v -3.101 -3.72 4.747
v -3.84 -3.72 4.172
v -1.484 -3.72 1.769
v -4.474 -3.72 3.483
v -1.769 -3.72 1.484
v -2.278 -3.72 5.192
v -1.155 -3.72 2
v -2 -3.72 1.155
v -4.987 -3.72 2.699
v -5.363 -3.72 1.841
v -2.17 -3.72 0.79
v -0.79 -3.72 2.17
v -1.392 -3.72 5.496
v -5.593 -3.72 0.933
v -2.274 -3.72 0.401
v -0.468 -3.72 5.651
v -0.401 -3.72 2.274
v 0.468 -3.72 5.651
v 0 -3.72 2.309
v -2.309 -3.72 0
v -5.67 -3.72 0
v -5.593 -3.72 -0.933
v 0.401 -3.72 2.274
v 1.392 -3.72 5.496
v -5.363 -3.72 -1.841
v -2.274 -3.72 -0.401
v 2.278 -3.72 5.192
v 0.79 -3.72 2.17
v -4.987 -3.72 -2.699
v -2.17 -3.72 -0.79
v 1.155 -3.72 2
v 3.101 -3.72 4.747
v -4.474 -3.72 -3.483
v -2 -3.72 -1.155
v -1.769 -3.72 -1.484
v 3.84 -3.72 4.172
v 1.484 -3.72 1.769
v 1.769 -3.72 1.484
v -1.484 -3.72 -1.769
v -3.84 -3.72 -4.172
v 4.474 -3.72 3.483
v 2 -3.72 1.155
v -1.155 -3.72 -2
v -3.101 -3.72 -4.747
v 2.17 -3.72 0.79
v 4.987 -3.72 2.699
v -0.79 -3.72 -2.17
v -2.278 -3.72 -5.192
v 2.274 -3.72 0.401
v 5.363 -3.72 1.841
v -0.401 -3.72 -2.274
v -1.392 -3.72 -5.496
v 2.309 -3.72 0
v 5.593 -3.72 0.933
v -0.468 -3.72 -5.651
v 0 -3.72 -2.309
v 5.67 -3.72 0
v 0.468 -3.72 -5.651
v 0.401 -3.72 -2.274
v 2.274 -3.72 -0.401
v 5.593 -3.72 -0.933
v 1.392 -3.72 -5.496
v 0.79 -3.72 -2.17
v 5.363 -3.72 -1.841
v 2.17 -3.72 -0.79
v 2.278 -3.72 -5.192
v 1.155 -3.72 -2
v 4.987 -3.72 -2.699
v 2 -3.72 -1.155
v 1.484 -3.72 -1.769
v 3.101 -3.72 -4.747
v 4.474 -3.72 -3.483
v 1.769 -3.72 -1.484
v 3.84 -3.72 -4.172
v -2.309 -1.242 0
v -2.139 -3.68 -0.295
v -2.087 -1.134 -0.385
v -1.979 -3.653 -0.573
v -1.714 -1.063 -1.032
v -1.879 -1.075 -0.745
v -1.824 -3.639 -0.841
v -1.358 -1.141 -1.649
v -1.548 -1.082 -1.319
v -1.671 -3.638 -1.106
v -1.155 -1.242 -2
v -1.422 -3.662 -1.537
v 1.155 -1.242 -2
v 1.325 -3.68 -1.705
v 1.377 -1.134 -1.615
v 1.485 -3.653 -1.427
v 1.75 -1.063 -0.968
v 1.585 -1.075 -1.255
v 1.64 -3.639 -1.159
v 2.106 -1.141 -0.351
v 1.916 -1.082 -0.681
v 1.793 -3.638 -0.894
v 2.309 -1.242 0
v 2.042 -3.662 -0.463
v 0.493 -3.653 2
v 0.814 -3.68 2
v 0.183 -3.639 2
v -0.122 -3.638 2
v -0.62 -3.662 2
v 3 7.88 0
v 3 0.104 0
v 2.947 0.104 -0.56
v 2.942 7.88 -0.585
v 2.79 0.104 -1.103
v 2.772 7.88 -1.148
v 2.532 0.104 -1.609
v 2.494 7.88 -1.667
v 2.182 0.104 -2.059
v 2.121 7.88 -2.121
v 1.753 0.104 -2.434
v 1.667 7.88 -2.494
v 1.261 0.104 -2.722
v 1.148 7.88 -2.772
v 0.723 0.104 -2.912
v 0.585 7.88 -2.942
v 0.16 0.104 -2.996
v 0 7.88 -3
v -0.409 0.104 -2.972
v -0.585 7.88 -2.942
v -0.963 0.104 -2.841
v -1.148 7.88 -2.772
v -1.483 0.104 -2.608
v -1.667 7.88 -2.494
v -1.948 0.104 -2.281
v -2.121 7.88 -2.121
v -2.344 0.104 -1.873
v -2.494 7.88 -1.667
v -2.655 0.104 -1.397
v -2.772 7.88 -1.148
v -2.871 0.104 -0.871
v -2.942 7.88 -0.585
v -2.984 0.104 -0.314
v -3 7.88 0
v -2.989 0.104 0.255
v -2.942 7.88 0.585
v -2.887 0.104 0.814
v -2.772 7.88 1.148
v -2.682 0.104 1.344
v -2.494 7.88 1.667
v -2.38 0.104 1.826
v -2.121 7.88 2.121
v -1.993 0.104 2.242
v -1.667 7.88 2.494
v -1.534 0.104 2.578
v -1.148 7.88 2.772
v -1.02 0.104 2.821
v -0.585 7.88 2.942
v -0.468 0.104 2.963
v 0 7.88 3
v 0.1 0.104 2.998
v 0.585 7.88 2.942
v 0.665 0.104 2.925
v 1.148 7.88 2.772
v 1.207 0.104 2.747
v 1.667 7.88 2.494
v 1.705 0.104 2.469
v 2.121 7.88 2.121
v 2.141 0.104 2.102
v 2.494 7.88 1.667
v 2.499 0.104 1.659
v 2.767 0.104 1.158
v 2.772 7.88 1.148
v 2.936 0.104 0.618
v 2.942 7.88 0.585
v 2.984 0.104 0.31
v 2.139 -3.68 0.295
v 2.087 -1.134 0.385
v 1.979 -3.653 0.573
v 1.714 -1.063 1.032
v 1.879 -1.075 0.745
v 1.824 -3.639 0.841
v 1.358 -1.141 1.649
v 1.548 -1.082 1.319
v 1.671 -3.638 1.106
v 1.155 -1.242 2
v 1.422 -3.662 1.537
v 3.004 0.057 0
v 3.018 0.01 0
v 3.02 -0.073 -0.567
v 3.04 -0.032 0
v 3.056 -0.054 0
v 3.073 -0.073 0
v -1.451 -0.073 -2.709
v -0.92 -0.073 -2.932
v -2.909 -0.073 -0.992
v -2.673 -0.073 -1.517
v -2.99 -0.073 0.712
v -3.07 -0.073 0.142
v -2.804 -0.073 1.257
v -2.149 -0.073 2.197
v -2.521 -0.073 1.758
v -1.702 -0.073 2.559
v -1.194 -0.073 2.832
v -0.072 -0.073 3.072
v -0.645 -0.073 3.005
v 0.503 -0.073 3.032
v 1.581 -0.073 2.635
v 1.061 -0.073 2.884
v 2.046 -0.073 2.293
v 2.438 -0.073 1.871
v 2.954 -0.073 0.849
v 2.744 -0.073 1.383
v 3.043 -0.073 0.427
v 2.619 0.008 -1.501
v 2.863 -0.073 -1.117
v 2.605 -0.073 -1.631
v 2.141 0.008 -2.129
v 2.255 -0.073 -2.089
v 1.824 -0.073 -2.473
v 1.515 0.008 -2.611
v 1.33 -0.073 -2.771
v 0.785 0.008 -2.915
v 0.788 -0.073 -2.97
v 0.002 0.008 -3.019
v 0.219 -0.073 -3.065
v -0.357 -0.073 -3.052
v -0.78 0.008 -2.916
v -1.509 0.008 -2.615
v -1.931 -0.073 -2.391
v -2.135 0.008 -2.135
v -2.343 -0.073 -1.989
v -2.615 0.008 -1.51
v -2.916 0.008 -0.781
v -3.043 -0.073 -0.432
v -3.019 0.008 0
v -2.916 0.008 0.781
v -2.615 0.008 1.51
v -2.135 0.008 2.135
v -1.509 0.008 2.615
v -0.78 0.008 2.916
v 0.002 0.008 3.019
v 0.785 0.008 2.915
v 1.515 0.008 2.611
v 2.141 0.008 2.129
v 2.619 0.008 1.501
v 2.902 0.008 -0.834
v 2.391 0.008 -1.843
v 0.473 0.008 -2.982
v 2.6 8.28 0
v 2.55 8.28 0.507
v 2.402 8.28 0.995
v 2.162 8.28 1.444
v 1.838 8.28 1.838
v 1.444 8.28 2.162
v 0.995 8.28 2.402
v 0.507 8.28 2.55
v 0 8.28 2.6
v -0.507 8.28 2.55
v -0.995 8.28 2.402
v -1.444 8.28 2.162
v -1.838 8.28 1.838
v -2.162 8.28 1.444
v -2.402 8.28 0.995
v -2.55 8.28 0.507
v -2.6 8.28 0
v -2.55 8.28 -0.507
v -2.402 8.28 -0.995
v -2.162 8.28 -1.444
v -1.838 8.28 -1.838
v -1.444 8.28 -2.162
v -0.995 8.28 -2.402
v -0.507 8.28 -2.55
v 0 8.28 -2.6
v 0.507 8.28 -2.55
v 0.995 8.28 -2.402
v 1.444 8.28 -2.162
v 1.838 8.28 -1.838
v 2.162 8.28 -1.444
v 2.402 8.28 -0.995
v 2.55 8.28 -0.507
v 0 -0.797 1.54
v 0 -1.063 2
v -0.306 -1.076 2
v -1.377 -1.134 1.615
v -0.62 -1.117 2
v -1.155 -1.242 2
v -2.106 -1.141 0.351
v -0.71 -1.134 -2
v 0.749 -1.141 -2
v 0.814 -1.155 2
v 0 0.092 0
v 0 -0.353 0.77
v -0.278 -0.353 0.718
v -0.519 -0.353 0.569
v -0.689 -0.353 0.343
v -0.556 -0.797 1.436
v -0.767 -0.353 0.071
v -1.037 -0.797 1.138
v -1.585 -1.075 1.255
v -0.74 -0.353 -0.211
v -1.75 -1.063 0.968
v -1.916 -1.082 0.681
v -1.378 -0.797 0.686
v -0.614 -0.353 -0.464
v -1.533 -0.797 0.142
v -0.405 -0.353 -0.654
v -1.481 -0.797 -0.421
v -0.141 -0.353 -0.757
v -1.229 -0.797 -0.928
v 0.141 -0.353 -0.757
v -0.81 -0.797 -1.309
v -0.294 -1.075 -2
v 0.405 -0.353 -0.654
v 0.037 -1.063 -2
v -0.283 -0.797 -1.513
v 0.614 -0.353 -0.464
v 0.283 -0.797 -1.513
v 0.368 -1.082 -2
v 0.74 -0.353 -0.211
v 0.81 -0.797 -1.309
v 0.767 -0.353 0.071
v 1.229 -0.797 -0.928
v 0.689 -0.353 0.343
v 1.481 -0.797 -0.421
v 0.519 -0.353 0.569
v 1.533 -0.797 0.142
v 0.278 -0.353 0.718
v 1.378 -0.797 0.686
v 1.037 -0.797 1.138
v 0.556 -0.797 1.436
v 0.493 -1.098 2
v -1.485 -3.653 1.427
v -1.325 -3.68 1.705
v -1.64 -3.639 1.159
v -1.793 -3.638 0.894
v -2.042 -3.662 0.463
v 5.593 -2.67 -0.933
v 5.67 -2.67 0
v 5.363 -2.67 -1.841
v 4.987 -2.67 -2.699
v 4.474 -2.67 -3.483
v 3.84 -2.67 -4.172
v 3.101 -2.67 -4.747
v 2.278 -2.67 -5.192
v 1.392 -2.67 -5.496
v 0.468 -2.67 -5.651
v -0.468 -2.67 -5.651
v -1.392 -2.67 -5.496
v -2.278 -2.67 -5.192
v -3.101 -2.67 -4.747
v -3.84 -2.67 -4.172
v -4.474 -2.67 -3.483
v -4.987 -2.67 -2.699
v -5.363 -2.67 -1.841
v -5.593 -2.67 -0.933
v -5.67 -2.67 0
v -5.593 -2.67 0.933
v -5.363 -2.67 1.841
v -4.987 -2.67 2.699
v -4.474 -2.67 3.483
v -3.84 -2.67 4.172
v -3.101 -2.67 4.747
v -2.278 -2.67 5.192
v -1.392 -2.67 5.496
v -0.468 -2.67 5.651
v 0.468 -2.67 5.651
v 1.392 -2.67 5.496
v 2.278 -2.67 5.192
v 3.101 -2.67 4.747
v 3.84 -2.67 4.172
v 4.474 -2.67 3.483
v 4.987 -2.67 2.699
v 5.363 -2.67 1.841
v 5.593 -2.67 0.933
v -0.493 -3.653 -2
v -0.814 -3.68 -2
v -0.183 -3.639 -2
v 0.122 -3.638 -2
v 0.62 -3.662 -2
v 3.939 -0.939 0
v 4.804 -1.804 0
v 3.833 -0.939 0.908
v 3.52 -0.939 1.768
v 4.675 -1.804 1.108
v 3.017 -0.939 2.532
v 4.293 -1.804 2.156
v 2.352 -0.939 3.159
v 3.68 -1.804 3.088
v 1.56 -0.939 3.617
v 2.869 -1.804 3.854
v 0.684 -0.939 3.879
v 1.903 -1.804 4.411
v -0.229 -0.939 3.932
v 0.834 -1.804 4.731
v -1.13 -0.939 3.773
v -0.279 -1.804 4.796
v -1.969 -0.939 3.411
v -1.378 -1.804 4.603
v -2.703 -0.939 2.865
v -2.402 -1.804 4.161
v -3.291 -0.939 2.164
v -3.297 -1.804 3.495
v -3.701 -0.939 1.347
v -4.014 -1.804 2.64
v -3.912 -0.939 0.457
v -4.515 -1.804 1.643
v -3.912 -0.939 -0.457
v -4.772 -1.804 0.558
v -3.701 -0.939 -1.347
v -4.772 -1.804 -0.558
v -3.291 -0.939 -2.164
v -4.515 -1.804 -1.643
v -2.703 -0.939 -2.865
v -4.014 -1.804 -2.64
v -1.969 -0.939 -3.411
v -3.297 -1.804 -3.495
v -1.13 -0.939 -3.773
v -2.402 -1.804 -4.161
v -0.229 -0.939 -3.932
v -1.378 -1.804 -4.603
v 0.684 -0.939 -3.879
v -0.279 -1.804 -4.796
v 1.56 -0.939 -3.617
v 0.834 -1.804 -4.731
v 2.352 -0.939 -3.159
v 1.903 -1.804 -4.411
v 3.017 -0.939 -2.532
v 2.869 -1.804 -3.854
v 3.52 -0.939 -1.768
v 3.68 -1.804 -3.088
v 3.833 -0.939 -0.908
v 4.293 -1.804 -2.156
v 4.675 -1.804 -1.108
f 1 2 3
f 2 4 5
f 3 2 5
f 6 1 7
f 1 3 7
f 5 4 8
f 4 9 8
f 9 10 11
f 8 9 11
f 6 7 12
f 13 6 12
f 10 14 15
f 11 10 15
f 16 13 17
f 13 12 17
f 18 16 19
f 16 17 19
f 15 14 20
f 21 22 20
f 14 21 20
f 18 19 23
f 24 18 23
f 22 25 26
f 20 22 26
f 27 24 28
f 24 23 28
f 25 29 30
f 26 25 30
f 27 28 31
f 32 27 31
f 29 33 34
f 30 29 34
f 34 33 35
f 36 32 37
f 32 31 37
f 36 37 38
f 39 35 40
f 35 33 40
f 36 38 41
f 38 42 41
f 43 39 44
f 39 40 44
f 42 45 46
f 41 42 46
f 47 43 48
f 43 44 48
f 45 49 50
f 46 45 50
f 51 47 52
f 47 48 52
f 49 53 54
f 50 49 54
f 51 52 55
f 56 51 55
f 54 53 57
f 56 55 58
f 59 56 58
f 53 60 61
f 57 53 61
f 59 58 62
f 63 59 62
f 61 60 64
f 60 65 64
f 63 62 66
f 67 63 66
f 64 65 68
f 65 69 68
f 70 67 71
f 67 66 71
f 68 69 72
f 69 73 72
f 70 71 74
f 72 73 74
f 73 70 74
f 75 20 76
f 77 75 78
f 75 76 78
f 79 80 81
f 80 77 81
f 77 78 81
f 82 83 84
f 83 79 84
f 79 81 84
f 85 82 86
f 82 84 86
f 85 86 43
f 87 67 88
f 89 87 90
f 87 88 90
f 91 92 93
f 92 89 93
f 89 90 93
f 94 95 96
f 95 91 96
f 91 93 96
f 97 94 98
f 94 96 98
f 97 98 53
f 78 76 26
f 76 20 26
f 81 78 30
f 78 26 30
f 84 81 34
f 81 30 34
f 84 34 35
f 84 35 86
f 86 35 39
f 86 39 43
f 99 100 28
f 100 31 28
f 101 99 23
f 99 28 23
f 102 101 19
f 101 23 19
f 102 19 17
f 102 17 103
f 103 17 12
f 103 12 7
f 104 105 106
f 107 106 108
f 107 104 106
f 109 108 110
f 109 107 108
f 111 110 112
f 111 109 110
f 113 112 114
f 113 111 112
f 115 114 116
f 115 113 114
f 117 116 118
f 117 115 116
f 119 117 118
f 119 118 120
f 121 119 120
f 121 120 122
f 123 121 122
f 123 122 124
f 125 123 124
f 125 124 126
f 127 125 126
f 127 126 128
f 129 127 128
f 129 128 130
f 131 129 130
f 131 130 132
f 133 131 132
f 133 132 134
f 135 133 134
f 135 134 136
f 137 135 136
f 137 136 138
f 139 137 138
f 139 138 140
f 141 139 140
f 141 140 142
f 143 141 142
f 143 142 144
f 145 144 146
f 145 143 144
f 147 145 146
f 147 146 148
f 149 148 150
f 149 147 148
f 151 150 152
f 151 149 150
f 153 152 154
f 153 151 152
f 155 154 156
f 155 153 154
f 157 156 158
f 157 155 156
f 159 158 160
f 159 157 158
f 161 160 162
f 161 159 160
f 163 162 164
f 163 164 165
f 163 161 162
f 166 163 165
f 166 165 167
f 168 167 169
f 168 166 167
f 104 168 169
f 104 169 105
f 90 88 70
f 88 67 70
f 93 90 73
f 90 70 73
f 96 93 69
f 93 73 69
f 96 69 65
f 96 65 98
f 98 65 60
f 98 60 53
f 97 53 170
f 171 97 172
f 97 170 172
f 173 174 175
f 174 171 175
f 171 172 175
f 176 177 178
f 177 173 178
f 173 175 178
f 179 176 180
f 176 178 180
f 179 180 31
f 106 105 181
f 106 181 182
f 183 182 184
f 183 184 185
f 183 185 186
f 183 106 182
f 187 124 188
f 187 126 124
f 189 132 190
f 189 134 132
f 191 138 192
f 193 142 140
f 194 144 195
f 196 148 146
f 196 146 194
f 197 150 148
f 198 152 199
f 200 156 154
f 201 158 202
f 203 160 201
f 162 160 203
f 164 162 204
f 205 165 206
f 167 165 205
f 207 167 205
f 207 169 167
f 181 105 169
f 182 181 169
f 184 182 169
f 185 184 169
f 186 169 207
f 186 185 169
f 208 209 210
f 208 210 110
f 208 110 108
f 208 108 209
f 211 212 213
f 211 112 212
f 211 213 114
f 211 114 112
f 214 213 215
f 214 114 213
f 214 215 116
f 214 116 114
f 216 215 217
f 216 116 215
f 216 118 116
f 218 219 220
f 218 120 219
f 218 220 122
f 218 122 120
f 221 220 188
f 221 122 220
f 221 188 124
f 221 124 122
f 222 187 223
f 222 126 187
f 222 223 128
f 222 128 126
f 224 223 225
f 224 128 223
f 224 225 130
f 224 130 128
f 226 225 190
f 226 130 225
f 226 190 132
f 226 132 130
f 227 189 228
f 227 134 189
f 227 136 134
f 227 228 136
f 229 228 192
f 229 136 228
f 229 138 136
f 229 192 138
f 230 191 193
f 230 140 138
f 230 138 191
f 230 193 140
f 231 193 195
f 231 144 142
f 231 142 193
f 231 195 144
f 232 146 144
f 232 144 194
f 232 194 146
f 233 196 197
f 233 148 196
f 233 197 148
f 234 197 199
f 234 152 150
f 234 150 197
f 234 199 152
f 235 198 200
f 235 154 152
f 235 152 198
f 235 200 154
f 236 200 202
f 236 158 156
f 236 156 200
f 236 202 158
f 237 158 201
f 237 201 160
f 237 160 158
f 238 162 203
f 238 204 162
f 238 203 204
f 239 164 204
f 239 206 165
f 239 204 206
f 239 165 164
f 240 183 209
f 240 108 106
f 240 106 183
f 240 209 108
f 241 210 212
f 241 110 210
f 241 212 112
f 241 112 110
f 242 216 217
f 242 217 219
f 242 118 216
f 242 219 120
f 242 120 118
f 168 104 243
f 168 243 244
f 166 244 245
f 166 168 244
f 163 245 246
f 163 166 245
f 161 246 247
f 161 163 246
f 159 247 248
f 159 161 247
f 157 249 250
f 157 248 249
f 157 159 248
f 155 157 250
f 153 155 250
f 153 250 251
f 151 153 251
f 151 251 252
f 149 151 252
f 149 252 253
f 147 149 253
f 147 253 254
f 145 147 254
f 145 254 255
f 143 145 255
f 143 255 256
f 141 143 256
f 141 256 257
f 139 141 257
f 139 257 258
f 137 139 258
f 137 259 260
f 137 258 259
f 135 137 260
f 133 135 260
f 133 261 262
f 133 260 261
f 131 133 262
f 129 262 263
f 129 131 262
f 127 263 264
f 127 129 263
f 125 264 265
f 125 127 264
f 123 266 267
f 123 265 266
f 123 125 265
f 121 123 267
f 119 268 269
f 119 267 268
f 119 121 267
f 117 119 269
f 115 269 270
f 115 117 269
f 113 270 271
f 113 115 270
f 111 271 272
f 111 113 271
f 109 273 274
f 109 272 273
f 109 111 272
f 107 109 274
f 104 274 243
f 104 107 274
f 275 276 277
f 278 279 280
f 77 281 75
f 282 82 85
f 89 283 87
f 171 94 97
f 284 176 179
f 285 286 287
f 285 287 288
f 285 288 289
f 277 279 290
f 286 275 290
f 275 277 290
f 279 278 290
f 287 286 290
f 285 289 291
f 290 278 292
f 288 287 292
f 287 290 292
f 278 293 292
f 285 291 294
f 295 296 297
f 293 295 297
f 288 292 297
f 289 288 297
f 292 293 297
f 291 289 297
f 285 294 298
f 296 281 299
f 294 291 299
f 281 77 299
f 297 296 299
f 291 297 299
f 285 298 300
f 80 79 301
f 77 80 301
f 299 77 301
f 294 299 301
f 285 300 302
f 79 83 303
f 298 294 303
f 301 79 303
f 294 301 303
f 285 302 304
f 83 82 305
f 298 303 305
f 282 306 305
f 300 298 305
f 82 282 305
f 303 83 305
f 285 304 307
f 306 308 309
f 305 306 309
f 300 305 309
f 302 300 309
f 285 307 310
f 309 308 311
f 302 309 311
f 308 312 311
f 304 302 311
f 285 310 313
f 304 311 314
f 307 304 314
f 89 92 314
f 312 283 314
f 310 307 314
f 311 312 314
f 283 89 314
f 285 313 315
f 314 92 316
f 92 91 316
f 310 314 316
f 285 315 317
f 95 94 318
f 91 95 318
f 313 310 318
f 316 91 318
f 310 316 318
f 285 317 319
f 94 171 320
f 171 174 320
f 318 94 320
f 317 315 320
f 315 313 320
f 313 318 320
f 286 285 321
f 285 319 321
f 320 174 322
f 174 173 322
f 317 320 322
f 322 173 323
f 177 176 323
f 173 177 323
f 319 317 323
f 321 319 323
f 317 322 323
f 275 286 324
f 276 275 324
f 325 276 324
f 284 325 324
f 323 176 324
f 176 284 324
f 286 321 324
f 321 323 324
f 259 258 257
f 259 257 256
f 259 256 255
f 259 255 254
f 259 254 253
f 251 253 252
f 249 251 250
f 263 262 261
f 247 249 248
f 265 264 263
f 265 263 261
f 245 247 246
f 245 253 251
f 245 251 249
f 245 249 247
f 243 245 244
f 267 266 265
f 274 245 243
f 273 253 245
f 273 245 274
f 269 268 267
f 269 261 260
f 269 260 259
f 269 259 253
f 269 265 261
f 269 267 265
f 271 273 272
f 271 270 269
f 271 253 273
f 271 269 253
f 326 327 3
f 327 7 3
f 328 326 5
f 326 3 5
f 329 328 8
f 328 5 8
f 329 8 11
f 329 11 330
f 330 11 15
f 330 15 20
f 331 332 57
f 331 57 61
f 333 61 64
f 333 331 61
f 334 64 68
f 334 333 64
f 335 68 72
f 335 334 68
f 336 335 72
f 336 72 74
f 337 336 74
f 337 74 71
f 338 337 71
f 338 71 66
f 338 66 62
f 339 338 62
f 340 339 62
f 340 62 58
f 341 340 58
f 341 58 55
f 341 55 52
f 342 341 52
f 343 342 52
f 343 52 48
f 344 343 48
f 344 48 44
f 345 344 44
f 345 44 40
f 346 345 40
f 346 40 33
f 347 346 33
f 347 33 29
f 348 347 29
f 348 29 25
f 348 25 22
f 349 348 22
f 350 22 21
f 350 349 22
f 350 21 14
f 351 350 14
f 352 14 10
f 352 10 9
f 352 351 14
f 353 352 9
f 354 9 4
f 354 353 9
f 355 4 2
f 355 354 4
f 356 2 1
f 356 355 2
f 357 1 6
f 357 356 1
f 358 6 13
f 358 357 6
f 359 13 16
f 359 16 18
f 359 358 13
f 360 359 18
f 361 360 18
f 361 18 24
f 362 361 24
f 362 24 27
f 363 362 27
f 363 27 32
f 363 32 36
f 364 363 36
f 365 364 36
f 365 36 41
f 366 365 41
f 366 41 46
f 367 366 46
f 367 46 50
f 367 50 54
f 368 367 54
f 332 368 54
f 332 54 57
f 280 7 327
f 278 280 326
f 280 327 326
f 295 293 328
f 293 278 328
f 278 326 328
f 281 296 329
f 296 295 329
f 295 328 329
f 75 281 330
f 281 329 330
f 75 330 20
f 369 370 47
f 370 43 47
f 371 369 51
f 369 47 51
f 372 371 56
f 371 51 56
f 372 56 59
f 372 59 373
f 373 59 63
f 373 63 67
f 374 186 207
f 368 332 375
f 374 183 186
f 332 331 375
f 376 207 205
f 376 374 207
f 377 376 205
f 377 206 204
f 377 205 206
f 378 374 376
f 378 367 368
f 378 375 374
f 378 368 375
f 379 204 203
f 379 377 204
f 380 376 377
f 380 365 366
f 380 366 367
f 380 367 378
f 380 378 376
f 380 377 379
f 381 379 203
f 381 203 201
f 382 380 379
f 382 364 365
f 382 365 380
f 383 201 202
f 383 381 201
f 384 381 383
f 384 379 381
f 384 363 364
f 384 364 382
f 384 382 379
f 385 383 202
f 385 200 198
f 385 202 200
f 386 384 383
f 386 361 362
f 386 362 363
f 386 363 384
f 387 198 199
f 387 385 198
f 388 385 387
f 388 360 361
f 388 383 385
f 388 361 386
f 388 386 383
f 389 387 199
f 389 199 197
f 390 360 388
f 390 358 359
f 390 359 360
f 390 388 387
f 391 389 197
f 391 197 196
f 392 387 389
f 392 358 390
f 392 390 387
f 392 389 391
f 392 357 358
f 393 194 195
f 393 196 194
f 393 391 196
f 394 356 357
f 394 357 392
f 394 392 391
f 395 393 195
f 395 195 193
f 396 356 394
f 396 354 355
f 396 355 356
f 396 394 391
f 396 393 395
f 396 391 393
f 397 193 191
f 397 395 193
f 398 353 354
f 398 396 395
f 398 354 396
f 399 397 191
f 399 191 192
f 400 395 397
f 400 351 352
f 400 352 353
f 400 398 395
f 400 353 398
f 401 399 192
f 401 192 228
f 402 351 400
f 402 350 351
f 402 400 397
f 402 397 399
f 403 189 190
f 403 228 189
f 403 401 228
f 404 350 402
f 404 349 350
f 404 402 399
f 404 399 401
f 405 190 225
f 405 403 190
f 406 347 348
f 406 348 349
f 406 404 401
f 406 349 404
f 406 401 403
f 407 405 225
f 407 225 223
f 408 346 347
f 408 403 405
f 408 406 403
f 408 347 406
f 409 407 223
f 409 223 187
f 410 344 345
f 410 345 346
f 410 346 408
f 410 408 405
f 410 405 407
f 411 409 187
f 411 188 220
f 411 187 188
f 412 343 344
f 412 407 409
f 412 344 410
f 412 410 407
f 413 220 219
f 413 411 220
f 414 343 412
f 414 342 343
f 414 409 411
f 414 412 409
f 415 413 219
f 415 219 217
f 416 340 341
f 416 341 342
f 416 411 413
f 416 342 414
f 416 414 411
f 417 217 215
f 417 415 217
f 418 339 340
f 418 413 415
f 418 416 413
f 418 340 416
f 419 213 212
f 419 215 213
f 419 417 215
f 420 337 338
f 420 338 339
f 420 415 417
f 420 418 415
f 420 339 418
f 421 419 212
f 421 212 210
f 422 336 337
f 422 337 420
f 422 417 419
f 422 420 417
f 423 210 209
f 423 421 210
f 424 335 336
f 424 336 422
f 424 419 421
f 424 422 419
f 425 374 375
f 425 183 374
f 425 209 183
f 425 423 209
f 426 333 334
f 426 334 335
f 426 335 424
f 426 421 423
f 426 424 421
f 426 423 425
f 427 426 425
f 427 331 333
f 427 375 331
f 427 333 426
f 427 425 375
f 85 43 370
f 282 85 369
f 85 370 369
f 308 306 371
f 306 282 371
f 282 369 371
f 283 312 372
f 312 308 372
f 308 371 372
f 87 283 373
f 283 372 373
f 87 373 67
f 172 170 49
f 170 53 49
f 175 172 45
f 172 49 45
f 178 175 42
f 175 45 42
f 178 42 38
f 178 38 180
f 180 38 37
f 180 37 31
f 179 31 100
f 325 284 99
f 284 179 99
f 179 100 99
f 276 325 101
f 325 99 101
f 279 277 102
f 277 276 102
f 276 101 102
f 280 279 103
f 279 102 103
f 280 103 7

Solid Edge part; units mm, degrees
sketch "Sketch1" plane through (0, 0, 0) normal (0, 0, 1) x (1, 0, 0)
  line L0 (3, 0) -> (3, 8.28)
  line L1 (0, 8.28) -> (3, 8.28)
  line L2 (0, 0) -> (0, 8.28)
  line L3 (0, 0) -> (0, -3.72)
  line L4 (0, -3.72) -> (5.67, -3.72)
  line L5 (5.67, -3.72) -> (5.67, -2.67)
  line L6 (5.67, -2.67) -> (3, 0)
revolve "RevolvedProtrusion1" add sketch "Sketch1" angle 360 about axis through (0, 0, 0) along (0, 1, 0)
sketch "Sketch2" plane through (0, 0, 0) normal (1, 0, 0) x (0, 1, 0)
  line L0 (-3.72, 2.7915) -> (-1.52, 2.7915)
  line L1 (0.0917, 0) -> (-1.52, 2.7915)
  line L2 (-3.72, 0) -> (0.0917, 0)
  line L3 (-3.72, 0) -> (-3.72, 2.7915)
revolve "RevolvedCutout1" cut sketch "Sketch2" angle 360 about axis through (0, -4.5, 0) along (0, 1, 0)
sketch "Sketch3" plane through (0, -3.72, 0) normal (0, -1, 0) x (0, 0, 1)
  circle A0 centre (0, 0) radius 2.7915
  line L0 (-2, -1.1547) -> (0, -2.3094)
  line L1 (0, -2.3094) -> (2, -1.1547)
  line L2 (2, -1.1547) -> (2, 1.1547)
  line L3 (2, 1.1547) -> (0, 2.3094)
  line L4 (0, 2.3094) -> (-2, 1.1547)
  line L5 (-2, 1.1547) -> (-2, -1.1547)
  dimension "D1" = 4
extrude "Protrusion1" add sketch "Sketch3" against normal up to next
sketch "Sketch4" plane through (0, 0, 0) normal (0, 0, 1) x (1, 0, 0)
  line L0 (-2.3094, -3.72) -> (0, -3.72)
  line L1 (0, -3.72) -> (0, -3.1012)
  line L2 (0, -3.1012) -> (-2.3094, -3.72)
revolve "RevolvedCutout2" cut sketch "Sketch4" angle 360 about axis through (0, -4.5, 0) along (0, 1, 0)
fillet "Round1" radius 0.25 1 edges at (0, 0, -3)
chamfer "倒斜角_2" distance 0.4 angle 45 1 edges at (0, 8.28, -3)
cosmetic_thread "Thread1" size "M6"
